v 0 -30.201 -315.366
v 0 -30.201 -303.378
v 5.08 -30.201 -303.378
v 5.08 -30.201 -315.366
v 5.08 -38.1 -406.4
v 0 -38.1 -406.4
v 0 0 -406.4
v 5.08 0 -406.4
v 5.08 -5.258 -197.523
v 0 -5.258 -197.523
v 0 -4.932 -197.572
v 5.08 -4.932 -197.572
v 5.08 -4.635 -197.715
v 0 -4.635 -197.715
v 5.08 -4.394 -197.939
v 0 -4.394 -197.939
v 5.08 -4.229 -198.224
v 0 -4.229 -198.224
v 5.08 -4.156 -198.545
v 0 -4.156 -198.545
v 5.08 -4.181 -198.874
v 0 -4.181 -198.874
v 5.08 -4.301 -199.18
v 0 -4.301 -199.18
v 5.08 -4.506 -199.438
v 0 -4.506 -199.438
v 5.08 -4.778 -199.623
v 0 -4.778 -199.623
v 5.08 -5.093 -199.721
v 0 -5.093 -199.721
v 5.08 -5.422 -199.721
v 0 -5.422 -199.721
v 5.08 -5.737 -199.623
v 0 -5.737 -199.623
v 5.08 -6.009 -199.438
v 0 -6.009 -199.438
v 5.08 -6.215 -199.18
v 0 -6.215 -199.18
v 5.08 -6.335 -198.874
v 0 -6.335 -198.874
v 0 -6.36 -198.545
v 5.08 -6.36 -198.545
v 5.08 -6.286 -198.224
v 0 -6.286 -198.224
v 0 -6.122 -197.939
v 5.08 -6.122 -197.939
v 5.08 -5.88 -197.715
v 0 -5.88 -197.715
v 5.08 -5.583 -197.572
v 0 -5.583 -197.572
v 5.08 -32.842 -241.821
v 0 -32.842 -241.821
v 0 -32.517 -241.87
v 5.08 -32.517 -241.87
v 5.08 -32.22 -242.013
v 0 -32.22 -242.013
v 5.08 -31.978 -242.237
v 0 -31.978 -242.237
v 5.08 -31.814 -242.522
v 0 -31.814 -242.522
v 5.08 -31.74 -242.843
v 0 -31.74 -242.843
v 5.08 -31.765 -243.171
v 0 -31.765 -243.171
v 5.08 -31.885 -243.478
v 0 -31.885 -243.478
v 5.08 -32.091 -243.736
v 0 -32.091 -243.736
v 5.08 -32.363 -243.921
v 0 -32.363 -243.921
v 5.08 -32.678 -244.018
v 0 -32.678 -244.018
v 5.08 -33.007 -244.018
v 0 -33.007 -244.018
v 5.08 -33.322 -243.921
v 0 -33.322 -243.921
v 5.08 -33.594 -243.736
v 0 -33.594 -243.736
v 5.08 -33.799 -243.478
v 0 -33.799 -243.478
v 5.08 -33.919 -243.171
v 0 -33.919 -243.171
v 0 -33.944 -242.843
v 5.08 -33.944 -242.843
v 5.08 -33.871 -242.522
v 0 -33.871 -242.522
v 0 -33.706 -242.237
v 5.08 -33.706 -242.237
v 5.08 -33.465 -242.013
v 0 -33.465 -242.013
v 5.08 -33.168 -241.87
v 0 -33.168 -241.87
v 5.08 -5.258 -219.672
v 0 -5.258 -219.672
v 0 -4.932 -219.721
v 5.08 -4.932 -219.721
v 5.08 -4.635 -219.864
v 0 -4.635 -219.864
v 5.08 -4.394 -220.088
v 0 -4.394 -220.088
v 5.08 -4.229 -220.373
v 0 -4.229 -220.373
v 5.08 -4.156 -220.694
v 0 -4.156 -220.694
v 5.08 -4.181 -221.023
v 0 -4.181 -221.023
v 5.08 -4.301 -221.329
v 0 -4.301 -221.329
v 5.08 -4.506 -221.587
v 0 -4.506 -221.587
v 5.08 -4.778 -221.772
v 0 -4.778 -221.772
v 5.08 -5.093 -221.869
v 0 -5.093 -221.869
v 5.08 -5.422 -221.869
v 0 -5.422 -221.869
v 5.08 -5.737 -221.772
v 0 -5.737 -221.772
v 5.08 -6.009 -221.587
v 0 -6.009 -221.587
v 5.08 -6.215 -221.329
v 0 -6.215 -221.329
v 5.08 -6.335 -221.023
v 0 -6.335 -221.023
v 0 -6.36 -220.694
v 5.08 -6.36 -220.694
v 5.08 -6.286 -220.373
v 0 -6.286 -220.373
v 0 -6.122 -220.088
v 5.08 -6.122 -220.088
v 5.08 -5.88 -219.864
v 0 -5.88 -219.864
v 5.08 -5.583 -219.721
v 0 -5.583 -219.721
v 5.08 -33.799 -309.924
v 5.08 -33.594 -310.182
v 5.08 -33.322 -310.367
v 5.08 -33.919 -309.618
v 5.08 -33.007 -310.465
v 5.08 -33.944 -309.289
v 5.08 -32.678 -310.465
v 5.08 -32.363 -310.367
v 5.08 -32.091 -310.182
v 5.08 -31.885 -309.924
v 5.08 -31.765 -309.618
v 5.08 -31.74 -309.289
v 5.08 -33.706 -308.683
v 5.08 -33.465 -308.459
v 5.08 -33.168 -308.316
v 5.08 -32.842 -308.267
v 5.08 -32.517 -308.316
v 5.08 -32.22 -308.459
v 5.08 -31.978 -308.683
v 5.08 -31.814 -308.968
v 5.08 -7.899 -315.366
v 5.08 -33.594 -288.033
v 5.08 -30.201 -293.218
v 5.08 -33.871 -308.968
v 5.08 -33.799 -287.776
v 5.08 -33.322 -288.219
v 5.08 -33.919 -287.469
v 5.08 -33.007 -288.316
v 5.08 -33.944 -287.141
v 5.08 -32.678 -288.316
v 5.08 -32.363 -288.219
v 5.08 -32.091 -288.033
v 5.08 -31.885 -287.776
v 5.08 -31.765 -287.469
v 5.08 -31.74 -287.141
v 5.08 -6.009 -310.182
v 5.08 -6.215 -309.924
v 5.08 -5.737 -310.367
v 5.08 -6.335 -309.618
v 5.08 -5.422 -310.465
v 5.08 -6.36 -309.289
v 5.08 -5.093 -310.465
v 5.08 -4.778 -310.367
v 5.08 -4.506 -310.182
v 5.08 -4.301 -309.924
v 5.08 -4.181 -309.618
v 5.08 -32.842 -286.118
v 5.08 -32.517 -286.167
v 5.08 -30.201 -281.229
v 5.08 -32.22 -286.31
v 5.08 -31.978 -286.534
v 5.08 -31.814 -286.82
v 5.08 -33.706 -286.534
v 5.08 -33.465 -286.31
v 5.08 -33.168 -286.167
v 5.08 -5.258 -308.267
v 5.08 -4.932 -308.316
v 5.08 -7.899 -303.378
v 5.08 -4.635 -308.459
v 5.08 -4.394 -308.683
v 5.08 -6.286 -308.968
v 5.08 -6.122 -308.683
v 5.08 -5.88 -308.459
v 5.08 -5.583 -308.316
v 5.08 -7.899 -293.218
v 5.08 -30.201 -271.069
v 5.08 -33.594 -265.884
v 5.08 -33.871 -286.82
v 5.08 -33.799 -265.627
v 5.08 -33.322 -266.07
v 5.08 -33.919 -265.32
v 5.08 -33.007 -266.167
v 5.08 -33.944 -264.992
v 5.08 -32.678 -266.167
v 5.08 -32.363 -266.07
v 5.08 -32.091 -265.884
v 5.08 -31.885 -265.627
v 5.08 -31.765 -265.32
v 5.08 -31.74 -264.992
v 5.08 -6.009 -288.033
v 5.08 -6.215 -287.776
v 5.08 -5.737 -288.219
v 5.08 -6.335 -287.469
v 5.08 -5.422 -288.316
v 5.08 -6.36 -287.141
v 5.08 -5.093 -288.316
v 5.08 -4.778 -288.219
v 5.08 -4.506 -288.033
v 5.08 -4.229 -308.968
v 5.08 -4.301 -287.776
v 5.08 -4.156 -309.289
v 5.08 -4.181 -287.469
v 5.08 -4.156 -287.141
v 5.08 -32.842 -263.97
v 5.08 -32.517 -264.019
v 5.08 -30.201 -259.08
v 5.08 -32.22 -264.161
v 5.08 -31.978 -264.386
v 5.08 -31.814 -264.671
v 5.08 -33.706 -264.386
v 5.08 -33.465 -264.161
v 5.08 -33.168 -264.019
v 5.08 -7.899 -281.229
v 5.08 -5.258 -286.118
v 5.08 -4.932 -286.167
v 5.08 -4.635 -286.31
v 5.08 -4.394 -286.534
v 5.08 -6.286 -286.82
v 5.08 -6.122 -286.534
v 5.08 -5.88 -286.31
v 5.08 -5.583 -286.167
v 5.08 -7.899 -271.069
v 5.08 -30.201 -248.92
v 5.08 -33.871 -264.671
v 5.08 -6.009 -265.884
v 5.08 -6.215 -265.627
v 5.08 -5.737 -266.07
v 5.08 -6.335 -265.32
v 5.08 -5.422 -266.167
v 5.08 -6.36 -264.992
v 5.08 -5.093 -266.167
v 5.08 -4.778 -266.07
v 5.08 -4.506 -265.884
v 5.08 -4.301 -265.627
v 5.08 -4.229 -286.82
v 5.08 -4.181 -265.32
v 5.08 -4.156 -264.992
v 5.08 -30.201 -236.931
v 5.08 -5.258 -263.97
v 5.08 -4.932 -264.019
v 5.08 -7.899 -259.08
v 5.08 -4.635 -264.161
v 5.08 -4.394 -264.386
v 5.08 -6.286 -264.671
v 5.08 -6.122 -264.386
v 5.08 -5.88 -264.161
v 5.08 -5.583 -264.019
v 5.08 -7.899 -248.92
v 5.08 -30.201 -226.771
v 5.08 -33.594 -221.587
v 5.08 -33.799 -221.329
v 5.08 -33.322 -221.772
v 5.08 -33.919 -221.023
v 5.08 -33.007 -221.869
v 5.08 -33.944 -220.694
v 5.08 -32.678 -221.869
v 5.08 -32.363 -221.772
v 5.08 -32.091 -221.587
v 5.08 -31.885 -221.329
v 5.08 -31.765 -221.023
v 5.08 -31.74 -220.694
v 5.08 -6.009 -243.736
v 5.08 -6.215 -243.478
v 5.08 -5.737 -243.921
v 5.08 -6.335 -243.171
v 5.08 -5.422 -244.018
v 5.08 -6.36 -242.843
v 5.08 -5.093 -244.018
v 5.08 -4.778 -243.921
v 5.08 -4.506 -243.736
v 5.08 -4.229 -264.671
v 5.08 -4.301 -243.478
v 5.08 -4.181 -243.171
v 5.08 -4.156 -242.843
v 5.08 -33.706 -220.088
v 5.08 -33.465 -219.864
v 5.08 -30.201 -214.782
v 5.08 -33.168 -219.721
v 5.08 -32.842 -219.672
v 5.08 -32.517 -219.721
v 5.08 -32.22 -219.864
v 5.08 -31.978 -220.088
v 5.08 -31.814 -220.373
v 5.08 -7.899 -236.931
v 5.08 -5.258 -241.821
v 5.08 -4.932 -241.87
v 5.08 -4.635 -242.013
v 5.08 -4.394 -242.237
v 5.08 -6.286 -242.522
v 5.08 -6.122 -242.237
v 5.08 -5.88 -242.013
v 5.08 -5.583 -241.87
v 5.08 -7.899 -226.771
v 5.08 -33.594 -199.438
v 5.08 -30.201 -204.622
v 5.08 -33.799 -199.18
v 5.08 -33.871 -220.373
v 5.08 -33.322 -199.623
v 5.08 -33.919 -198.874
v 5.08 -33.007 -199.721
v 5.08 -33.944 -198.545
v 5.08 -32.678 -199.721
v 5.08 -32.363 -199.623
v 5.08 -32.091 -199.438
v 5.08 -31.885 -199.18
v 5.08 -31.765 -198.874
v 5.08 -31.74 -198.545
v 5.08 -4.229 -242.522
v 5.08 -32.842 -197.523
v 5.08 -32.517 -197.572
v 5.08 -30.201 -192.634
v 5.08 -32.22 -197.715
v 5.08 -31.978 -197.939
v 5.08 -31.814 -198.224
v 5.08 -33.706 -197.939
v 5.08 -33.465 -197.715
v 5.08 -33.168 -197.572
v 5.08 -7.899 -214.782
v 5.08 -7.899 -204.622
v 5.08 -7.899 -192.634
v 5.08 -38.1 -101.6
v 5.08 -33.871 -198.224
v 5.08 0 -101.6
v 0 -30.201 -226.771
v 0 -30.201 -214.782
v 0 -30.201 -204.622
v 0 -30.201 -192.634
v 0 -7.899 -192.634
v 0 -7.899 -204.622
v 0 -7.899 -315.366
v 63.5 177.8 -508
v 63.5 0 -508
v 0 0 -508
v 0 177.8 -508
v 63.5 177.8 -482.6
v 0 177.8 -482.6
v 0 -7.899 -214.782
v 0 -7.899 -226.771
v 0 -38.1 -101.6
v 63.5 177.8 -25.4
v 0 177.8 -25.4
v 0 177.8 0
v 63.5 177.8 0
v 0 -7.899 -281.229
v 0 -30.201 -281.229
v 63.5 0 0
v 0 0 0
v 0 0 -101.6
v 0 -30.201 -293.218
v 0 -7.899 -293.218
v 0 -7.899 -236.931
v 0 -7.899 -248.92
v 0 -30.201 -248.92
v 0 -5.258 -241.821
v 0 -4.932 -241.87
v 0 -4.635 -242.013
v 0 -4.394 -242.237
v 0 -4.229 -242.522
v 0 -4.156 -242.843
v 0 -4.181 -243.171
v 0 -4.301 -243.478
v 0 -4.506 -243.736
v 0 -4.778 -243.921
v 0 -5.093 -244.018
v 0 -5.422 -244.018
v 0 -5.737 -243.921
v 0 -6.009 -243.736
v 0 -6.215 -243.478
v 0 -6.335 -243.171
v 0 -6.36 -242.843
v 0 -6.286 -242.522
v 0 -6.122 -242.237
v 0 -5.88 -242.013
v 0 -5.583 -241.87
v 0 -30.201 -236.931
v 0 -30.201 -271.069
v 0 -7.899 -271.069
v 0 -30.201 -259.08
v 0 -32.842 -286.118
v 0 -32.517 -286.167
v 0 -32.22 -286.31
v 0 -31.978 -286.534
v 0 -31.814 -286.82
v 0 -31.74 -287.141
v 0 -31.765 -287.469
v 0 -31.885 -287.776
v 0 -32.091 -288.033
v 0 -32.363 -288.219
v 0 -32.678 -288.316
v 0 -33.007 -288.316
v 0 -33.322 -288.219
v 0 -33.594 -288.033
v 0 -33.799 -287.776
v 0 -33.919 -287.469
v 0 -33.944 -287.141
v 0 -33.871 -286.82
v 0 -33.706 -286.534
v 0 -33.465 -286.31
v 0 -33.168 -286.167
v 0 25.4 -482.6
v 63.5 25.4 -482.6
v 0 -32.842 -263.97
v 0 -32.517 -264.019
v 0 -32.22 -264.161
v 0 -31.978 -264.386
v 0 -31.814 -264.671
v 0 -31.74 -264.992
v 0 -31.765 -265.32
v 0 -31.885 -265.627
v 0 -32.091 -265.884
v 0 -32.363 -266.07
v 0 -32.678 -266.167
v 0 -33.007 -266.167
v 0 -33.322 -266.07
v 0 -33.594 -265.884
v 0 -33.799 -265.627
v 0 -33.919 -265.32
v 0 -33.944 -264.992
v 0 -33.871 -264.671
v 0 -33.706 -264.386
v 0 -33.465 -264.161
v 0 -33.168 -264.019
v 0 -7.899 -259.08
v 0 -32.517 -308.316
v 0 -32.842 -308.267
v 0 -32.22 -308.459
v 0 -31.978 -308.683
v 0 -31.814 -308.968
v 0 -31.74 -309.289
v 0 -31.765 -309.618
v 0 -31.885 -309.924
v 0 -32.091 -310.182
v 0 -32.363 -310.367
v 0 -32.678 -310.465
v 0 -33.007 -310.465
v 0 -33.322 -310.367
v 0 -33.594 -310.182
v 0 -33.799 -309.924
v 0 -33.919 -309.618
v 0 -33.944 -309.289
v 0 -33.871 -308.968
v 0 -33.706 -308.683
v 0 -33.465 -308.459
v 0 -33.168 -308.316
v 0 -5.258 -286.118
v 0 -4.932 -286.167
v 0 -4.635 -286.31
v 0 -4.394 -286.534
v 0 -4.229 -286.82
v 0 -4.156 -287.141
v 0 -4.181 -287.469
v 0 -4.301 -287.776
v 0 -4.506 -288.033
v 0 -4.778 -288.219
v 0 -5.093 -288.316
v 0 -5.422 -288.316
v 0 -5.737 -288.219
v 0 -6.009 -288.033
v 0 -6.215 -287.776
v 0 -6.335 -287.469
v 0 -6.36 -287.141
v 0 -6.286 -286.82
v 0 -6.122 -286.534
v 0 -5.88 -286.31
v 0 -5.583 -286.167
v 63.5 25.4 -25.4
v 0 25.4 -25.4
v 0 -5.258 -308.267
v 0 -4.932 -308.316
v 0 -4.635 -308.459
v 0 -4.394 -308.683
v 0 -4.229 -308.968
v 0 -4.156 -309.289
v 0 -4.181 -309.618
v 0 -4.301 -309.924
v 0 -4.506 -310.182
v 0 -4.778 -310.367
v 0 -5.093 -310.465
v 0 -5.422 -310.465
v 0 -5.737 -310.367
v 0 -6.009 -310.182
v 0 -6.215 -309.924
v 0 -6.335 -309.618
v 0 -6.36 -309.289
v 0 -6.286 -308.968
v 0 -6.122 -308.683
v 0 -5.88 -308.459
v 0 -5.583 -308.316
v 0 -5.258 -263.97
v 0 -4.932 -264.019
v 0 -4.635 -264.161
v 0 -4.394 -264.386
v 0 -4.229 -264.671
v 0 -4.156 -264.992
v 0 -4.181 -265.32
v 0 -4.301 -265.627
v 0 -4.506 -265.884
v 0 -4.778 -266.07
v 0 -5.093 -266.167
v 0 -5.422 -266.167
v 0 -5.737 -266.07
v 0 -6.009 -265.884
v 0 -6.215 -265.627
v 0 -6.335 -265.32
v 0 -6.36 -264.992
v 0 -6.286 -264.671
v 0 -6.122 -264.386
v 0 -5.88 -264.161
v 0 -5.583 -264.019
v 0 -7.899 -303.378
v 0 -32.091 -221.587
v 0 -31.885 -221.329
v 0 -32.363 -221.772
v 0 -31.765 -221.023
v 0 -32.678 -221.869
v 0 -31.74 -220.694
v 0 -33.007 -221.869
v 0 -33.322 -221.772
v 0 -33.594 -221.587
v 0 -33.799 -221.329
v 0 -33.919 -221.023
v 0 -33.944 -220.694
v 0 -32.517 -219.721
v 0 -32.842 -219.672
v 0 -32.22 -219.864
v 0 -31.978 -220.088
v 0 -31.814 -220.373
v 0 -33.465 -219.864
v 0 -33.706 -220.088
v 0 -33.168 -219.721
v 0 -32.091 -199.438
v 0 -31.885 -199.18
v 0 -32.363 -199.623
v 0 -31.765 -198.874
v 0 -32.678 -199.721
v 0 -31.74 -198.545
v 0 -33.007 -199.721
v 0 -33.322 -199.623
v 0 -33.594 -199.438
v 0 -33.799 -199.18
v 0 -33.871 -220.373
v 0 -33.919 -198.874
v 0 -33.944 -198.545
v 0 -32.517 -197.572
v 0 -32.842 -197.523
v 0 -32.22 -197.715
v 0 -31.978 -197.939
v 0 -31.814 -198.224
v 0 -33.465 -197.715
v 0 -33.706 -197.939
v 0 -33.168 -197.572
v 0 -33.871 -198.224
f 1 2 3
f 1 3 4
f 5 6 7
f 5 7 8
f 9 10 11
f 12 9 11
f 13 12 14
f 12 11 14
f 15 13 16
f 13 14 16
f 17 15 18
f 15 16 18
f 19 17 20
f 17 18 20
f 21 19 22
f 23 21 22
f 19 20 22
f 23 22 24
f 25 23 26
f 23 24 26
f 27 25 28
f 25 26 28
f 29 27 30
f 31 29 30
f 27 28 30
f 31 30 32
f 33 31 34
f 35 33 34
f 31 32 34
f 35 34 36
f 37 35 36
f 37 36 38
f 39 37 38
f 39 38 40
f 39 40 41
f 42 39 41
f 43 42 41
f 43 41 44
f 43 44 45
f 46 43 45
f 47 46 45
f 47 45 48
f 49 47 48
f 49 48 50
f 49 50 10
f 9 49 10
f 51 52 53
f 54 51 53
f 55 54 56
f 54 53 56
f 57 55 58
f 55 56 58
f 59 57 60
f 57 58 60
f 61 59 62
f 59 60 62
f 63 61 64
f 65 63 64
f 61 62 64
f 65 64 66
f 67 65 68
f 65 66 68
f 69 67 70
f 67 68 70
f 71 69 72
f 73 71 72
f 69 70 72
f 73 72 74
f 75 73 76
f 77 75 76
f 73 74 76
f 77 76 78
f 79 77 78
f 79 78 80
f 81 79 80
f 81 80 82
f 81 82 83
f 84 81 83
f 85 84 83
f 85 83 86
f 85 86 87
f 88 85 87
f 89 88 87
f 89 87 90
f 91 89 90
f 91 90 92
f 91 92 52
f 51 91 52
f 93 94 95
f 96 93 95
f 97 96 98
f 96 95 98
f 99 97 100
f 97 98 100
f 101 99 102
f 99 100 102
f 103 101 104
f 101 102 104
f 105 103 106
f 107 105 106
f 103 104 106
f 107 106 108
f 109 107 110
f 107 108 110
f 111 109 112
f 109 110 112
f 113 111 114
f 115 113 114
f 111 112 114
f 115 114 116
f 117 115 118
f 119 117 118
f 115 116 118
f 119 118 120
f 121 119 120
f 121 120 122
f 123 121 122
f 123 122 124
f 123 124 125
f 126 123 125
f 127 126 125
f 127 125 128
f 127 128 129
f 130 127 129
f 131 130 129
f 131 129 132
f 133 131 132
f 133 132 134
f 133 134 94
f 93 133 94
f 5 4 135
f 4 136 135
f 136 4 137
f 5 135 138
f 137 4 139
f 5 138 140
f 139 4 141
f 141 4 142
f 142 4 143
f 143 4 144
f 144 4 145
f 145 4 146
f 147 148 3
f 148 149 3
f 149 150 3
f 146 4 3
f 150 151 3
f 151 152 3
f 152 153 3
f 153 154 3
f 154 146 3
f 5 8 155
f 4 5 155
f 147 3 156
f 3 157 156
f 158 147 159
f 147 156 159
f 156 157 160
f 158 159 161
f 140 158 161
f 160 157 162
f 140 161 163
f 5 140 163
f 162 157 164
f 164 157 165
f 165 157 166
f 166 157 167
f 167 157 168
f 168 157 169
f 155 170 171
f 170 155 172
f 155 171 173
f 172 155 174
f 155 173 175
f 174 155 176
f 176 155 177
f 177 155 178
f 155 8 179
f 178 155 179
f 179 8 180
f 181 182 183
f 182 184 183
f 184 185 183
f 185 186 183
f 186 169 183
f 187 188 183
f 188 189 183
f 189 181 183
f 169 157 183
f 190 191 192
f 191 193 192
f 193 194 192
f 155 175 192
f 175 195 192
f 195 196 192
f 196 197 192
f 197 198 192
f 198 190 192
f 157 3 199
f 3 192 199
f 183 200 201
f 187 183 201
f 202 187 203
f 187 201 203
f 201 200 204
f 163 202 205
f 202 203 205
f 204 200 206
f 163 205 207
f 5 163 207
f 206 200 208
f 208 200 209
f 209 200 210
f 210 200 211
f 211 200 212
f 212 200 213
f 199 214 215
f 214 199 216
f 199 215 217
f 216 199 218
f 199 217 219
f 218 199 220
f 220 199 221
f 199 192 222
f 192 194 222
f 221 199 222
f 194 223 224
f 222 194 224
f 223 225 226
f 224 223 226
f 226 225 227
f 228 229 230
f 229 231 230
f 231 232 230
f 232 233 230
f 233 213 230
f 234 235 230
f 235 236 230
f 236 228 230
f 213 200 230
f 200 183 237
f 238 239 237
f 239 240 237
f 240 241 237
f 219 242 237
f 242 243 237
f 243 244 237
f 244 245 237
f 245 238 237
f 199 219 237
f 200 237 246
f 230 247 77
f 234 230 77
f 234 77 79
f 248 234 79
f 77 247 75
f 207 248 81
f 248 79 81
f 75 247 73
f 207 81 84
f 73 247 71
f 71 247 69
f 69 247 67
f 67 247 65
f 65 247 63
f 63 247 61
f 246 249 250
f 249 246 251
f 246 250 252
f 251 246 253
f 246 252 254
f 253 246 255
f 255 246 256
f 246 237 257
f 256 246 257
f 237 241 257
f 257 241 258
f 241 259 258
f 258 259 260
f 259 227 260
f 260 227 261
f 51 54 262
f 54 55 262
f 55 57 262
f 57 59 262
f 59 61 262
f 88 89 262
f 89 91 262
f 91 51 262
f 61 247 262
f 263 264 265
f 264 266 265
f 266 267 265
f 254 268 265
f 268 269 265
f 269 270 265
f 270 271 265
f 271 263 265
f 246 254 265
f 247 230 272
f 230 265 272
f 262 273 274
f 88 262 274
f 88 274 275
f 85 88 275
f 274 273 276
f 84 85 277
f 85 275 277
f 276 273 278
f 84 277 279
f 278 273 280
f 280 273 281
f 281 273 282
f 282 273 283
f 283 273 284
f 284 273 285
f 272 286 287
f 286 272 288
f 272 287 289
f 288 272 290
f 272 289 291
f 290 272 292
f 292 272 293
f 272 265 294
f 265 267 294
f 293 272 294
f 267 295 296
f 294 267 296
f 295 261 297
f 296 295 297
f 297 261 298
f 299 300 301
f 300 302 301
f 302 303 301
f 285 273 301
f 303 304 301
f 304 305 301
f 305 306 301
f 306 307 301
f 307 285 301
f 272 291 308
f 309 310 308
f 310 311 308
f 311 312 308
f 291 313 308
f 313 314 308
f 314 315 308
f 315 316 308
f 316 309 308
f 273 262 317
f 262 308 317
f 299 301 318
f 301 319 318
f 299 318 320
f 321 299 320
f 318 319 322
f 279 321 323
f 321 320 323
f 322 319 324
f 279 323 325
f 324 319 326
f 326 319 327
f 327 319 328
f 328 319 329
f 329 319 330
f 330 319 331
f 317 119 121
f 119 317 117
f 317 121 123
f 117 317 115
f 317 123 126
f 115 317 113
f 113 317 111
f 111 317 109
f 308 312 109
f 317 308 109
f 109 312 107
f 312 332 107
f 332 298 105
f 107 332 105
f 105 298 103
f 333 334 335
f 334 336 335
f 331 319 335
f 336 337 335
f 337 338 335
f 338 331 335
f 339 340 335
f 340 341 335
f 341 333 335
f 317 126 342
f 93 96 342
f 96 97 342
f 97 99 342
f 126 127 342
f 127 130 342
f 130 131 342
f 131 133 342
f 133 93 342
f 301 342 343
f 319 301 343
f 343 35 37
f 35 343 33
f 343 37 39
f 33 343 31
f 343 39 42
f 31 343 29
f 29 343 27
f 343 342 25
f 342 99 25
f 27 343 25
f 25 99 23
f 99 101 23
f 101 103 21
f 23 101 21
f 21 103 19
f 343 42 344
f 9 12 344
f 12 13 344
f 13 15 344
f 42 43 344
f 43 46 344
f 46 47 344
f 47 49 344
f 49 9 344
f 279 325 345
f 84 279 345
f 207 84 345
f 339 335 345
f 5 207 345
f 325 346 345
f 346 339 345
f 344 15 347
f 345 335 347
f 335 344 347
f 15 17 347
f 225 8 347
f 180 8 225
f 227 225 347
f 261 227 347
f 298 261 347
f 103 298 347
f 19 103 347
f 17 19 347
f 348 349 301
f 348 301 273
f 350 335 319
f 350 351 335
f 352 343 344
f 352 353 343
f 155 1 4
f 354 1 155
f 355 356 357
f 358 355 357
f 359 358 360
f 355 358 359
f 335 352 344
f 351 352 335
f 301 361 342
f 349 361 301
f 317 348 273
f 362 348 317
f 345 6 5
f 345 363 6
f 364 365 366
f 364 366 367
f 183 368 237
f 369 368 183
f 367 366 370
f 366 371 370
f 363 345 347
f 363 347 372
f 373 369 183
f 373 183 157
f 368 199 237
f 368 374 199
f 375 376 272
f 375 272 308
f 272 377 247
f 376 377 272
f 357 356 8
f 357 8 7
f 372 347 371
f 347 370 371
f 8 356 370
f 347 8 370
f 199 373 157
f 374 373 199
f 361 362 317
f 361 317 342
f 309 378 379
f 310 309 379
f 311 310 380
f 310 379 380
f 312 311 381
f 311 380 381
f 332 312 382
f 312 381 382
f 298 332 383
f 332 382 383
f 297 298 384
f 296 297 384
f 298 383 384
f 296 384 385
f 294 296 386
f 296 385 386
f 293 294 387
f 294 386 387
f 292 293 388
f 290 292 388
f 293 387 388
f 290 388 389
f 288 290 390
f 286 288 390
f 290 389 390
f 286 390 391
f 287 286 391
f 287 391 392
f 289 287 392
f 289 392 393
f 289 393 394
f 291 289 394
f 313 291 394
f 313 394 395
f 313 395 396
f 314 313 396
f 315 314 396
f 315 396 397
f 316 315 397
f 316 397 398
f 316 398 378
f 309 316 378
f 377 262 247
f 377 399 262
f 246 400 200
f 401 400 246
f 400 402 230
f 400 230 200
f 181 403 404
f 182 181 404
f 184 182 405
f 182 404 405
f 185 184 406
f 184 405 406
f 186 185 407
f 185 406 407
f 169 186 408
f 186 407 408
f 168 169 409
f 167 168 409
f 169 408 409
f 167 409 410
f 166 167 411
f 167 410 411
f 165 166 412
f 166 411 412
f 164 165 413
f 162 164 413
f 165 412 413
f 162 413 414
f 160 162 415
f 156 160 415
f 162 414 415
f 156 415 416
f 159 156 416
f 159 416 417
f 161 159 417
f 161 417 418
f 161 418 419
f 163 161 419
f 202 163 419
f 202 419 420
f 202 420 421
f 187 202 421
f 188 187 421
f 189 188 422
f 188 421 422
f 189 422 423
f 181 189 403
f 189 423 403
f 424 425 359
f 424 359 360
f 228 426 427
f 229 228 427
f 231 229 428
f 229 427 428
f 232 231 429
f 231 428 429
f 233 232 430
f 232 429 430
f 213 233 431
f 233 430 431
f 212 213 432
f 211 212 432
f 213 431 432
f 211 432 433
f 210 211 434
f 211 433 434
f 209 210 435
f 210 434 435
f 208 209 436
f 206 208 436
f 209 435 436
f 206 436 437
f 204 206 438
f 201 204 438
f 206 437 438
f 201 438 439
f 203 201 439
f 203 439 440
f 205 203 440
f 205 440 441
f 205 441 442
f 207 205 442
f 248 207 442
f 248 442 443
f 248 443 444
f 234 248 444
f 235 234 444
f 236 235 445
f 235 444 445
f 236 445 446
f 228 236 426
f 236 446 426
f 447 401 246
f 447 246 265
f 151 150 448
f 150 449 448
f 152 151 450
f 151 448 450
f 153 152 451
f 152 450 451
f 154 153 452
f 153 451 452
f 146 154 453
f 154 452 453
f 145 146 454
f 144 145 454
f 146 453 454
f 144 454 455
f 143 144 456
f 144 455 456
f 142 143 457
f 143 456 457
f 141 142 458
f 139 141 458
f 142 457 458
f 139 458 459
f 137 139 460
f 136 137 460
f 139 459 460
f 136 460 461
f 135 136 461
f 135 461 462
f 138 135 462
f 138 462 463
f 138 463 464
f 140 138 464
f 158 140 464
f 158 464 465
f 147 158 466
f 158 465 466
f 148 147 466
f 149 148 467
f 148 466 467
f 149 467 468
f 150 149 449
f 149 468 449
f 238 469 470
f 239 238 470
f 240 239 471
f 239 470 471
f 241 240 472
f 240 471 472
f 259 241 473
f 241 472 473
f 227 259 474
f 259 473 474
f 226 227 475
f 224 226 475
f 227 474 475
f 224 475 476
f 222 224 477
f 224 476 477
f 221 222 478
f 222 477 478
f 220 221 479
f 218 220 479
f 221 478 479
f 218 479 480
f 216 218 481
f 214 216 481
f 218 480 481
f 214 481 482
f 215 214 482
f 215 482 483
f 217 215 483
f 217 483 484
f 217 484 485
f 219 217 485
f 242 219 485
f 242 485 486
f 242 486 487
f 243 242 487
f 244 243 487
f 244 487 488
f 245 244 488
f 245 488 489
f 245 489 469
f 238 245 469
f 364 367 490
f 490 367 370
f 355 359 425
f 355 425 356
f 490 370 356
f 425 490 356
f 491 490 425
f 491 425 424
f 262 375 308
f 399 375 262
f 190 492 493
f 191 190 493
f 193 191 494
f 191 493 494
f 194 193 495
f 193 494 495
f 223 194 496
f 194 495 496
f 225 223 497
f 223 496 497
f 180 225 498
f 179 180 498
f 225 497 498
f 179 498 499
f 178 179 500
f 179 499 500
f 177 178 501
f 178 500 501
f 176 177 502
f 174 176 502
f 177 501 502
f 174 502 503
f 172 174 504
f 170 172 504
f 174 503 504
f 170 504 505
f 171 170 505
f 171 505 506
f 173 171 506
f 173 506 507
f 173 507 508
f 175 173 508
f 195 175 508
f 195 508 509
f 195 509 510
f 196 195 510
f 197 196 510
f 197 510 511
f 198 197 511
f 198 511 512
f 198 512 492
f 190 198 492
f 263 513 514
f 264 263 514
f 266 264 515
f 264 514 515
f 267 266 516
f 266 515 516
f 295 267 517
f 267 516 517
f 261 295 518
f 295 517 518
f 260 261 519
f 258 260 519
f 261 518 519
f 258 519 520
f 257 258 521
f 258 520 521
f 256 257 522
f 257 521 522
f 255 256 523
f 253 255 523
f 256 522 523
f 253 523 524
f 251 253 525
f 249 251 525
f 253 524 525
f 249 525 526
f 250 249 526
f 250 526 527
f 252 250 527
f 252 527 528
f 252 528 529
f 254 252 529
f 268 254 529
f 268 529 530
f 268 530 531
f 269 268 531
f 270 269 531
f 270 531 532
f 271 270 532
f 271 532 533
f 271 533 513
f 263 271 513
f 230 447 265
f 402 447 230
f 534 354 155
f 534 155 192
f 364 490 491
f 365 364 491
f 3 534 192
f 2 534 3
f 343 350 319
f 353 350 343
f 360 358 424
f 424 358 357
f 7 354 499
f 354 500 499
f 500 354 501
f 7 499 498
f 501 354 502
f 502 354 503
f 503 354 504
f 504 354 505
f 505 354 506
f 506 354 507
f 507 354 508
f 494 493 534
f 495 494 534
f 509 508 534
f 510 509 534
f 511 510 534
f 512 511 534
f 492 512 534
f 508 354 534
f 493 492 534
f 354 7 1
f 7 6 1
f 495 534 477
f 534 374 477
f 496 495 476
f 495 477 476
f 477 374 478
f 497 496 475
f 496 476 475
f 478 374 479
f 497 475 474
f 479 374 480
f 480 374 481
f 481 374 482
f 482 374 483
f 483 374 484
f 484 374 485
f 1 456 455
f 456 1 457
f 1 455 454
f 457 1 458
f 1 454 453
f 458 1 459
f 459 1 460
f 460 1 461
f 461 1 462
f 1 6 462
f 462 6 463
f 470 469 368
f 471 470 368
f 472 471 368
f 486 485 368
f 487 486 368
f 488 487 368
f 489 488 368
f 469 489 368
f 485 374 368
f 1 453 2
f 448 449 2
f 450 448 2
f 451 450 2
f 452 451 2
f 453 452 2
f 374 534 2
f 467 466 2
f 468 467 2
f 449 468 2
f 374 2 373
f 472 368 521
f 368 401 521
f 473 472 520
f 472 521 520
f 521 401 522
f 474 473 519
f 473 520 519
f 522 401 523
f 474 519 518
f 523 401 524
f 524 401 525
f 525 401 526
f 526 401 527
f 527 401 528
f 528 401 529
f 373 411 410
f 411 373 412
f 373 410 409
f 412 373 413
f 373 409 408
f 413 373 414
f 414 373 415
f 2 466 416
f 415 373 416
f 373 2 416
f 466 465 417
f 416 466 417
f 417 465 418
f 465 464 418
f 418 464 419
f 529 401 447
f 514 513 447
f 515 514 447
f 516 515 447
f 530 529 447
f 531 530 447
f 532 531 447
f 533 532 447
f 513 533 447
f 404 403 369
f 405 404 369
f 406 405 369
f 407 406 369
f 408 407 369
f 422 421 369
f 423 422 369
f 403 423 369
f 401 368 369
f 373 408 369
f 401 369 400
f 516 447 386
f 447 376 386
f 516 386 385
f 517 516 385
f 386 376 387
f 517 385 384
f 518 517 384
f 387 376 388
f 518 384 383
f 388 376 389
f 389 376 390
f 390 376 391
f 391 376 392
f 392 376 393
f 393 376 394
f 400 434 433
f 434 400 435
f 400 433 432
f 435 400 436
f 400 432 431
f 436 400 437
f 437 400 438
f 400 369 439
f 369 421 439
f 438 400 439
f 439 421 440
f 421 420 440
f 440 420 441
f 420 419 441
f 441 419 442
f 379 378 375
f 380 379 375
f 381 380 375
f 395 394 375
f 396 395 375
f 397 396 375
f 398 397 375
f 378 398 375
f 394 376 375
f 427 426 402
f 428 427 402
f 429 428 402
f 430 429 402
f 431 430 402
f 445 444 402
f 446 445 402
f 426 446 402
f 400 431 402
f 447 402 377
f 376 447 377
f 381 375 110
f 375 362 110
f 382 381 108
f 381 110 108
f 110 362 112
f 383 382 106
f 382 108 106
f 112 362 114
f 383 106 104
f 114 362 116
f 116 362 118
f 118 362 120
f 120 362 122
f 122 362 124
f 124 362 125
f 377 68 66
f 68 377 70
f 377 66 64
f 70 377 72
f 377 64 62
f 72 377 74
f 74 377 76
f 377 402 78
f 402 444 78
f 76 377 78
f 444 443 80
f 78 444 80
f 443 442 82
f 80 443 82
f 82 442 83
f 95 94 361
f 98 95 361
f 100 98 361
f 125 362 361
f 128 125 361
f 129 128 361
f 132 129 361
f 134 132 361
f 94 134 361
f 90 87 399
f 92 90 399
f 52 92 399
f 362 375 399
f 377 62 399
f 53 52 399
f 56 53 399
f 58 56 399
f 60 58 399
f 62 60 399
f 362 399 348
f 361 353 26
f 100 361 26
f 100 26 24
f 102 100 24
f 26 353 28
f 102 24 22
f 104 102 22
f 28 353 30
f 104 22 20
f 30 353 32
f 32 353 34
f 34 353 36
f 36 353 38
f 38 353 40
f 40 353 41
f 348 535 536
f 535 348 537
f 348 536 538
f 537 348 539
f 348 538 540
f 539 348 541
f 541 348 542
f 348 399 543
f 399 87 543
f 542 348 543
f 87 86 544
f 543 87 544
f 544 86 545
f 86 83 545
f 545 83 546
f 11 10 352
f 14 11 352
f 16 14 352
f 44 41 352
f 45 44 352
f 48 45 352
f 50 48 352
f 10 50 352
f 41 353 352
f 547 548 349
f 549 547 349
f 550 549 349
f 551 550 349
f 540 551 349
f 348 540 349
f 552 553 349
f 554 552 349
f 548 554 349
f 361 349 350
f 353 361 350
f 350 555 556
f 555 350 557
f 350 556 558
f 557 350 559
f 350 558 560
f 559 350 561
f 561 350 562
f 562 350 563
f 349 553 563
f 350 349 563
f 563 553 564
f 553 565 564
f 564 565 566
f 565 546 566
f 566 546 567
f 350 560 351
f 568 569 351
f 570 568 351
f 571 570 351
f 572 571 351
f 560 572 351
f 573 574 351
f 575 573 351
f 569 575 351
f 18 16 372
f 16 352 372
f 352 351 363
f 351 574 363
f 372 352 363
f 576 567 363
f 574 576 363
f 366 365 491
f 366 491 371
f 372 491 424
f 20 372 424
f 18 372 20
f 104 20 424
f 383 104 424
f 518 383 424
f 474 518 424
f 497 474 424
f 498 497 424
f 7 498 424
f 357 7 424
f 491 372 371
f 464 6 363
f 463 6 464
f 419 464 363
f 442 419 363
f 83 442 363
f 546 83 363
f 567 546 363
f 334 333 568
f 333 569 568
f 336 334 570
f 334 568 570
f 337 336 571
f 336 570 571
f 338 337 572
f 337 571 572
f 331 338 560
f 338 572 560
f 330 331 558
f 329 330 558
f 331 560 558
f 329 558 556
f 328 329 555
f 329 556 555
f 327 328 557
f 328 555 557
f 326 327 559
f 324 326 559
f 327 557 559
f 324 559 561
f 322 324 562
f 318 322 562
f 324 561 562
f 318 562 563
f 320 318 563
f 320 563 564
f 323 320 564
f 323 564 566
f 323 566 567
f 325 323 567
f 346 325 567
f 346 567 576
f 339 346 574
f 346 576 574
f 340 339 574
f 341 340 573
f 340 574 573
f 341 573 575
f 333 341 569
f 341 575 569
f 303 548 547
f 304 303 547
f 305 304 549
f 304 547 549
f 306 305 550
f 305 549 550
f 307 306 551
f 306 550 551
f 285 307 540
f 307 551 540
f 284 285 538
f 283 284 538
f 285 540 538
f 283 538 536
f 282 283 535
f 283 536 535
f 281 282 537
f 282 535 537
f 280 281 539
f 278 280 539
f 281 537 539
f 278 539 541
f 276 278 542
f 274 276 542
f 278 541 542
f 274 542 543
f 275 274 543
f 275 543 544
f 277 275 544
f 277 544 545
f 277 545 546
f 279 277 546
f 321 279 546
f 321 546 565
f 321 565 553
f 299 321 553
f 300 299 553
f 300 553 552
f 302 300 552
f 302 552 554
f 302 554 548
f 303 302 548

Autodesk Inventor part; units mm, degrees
ref_plane "YZ Plane" through (0, 0, 0) normal (1, 0, 0) x (0, 1, 0)
ref_plane "XZ Plane" through (0, 0, 0) normal (0, 1, 0) x (-1, 0, 0)
ref_plane "XY Plane" through (0, 0, 0) normal (0, 0, 1) x (1, 0, 0)
sketch "Sketch1" plane through (0, 0, 0) normal (0, 1, 0) x (-1, 0, 0)
  line L0 (0, 0) -> (-63.5, 0)
  line L1 (-63.5, 0) -> (-63.5, -508)
  line L2 (-63.5, -508) -> (0, -508)
  line L3 (0, -508) -> (0, 0)
  dimension "d0" = 63.5
  dimension "d1" = 508
extrude "Extrusion1" add sketch "Sketch1" along normal blind 25.4
sketch "Sketch2" plane through (0, 25.4, 0) normal (0, 1, 0) x (1, 0, 0)
  line L0 (0, 508) -> (0, 0) projected
  line L1 (63.5, 0) -> (63.5, 508) projected
  line L2 (0, 0) -> (63.5, 0)
  line L3 (63.5, 0) -> (63.5, 25.4)
  line L4 (63.5, 25.4) -> (0, 25.4)
  line L5 (0, 25.4) -> (0, 0)
  line L6 (0, 508) -> (63.5, 508)
  line L7 (63.5, 508) -> (63.5, 482.6)
  line L8 (63.5, 482.6) -> (0, 482.6)
  line L9 (0, 482.6) -> (0, 508)
  dimension "d4" = 25.4
  dimension "d5" = 25.4
extrude "Extrusion2" add sketch "Sketch2" along normal blind 152.4 contours L6 L1 L8 L0 | L4 L1 L2 L0
sketch "Sketch3" plane through (0, 0, 0) normal (0, -1, 0) x (1, 0, 0)
  line L0 (0, -482.6) -> (0, -25.4) projected
  line L1 (0, -406.4) -> (5.08, -406.4)
  line L2 (5.08, -406.4) -> (5.08, -101.6)
  line L3 (5.08, -101.6) -> (0, -101.6)
  line L4 (0, -101.6) -> (0, -406.4)
  point P0 (0, 0)
  dimension "d8" = 5.08
  dimension "d9" = 304.8
extrude "Extrusion3" add sketch "Sketch3" along normal blind 38.1
sketch "Sketch4" plane through (0, 0, 0) normal (-1, 0, 0) x (0, 0, 1)
  line L0 (-192.6336, -30.2006) -> (-204.6224, -30.2006)
  line L1 (-204.6224, -30.2006) -> (-204.6224, -7.8994)
  line L2 (-204.6224, -7.8994) -> (-192.6336, -7.8994)
  line L3 (-192.6336, -7.8994) -> (-192.6336, -30.2006)
  line L4 (-214.7824, -30.2006) -> (-226.7712, -30.2006)
  line L5 (-226.7712, -30.2006) -> (-226.7712, -7.8994)
  line L6 (-226.7712, -7.8994) -> (-214.7824, -7.8994)
  line L7 (-214.7824, -7.8994) -> (-214.7824, -30.2006)
  line L8 (-236.9312, -30.2006) -> (-248.92, -30.2006)
  line L9 (-248.92, -30.2006) -> (-248.92, -7.8994)
  line L10 (-248.92, -7.8994) -> (-236.9312, -7.8994)
  line L11 (-236.9312, -7.8994) -> (-236.9312, -30.2006)
  line L12 (-259.08, -30.2006) -> (-271.0688, -30.2006)
  line L13 (-271.0688, -30.2006) -> (-271.0688, -7.8994)
  line L14 (-271.0688, -7.8994) -> (-259.08, -7.8994)
  line L15 (-259.08, -7.8994) -> (-259.08, -30.2006)
  line L16 (-281.2288, -30.2006) -> (-293.2176, -30.2006)
  line L17 (-293.2176, -30.2006) -> (-293.2176, -7.8994)
  line L18 (-293.2176, -7.8994) -> (-281.2288, -7.8994)
  line L19 (-281.2288, -7.8994) -> (-281.2288, -30.2006)
  line L20 (-303.3776, -30.2006) -> (-315.3664, -30.2006)
  line L21 (-315.3664, -30.2006) -> (-315.3664, -7.8994)
  line L22 (-315.3664, -7.8994) -> (-303.3776, -7.8994)
  line L23 (-303.3776, -7.8994) -> (-303.3776, -30.2006)
  line L24 (-406.4, 0) -> (-406.4, -38.1) projected
  circle A0 centre (-198.628, -32.8422) radius 1.1049
  circle A1 centre (-198.628, -5.2578) radius 1.1049
  circle A2 centre (-220.7768, -32.8422) radius 1.1049
  circle A3 centre (-220.7768, -5.2578) radius 1.1049
  circle A4 centre (-242.9256, -32.8422) radius 1.1049
  circle A5 centre (-242.9256, -5.2578) radius 1.1049
  circle A6 centre (-265.0744, -32.8422) radius 1.1049
  circle A7 centre (-265.0744, -5.2578) radius 1.1049
  circle A8 centre (-287.2232, -32.8422) radius 1.1049
  circle A9 centre (-287.2232, -5.2578) radius 1.1049
  circle A10 centre (-309.372, -32.8422) radius 1.1049
  circle A11 centre (-309.372, -5.2578) radius 1.1049
  line L25 (-101.6, 0) -> (-101.6, -38.1) projected
  point P0 (0, 0)
  dimension "d12" = 11.9888
  dimension "d13" = 22.3012
  dimension "d14" = 11.9888
  dimension "d15" = 22.3012
  dimension "d16" = 11.9888
  dimension "d17" = 22.3012
  dimension "d18" = 11.9888
  dimension "d19" = 22.3012
  dimension "d20" = 11.9888
  dimension "d21" = 22.3012
  dimension "d22" = 11.9888
  dimension "d23" = 22.3012
  dimension "d24" = 10.16
  dimension "d25" = 10.16
  dimension "d26" = 10.16
  dimension "d27" = 10.16
  dimension "d28" = 10.16
  dimension "d29" = 91.0336
  dimension "d30" = 2.2098
  dimension "d31" = 2.2098
  dimension "d32" = 2.2098
  dimension "d33" = 2.2098
  dimension "d34" = 2.2098
  dimension "d35" = 2.2098
  dimension "d36" = 2.2098
  dimension "d37" = 2.2098
  dimension "d38" = 2.2098
  dimension "d39" = 2.2098
  dimension "d40" = 2.2098
  dimension "d41" = 2.2098
  dimension "d42" = 22.1488
  dimension "d43" = 97.028
  dimension "d44" = 22.1488
  dimension "d45" = 22.1488
  dimension "d46" = 22.1488
  dimension "d47" = 22.1488
  dimension "d48" = 22.1488
  dimension "d49" = 22.1488
  dimension "d50" = 22.1488
  dimension "d51" = 22.1488
  dimension "d52" = 22.1488
  dimension "d53" = 97.028
extrude "Extrusion4" cut sketch "Sketch4" against normal blind 5.08
properties part number "guitar bridge"
